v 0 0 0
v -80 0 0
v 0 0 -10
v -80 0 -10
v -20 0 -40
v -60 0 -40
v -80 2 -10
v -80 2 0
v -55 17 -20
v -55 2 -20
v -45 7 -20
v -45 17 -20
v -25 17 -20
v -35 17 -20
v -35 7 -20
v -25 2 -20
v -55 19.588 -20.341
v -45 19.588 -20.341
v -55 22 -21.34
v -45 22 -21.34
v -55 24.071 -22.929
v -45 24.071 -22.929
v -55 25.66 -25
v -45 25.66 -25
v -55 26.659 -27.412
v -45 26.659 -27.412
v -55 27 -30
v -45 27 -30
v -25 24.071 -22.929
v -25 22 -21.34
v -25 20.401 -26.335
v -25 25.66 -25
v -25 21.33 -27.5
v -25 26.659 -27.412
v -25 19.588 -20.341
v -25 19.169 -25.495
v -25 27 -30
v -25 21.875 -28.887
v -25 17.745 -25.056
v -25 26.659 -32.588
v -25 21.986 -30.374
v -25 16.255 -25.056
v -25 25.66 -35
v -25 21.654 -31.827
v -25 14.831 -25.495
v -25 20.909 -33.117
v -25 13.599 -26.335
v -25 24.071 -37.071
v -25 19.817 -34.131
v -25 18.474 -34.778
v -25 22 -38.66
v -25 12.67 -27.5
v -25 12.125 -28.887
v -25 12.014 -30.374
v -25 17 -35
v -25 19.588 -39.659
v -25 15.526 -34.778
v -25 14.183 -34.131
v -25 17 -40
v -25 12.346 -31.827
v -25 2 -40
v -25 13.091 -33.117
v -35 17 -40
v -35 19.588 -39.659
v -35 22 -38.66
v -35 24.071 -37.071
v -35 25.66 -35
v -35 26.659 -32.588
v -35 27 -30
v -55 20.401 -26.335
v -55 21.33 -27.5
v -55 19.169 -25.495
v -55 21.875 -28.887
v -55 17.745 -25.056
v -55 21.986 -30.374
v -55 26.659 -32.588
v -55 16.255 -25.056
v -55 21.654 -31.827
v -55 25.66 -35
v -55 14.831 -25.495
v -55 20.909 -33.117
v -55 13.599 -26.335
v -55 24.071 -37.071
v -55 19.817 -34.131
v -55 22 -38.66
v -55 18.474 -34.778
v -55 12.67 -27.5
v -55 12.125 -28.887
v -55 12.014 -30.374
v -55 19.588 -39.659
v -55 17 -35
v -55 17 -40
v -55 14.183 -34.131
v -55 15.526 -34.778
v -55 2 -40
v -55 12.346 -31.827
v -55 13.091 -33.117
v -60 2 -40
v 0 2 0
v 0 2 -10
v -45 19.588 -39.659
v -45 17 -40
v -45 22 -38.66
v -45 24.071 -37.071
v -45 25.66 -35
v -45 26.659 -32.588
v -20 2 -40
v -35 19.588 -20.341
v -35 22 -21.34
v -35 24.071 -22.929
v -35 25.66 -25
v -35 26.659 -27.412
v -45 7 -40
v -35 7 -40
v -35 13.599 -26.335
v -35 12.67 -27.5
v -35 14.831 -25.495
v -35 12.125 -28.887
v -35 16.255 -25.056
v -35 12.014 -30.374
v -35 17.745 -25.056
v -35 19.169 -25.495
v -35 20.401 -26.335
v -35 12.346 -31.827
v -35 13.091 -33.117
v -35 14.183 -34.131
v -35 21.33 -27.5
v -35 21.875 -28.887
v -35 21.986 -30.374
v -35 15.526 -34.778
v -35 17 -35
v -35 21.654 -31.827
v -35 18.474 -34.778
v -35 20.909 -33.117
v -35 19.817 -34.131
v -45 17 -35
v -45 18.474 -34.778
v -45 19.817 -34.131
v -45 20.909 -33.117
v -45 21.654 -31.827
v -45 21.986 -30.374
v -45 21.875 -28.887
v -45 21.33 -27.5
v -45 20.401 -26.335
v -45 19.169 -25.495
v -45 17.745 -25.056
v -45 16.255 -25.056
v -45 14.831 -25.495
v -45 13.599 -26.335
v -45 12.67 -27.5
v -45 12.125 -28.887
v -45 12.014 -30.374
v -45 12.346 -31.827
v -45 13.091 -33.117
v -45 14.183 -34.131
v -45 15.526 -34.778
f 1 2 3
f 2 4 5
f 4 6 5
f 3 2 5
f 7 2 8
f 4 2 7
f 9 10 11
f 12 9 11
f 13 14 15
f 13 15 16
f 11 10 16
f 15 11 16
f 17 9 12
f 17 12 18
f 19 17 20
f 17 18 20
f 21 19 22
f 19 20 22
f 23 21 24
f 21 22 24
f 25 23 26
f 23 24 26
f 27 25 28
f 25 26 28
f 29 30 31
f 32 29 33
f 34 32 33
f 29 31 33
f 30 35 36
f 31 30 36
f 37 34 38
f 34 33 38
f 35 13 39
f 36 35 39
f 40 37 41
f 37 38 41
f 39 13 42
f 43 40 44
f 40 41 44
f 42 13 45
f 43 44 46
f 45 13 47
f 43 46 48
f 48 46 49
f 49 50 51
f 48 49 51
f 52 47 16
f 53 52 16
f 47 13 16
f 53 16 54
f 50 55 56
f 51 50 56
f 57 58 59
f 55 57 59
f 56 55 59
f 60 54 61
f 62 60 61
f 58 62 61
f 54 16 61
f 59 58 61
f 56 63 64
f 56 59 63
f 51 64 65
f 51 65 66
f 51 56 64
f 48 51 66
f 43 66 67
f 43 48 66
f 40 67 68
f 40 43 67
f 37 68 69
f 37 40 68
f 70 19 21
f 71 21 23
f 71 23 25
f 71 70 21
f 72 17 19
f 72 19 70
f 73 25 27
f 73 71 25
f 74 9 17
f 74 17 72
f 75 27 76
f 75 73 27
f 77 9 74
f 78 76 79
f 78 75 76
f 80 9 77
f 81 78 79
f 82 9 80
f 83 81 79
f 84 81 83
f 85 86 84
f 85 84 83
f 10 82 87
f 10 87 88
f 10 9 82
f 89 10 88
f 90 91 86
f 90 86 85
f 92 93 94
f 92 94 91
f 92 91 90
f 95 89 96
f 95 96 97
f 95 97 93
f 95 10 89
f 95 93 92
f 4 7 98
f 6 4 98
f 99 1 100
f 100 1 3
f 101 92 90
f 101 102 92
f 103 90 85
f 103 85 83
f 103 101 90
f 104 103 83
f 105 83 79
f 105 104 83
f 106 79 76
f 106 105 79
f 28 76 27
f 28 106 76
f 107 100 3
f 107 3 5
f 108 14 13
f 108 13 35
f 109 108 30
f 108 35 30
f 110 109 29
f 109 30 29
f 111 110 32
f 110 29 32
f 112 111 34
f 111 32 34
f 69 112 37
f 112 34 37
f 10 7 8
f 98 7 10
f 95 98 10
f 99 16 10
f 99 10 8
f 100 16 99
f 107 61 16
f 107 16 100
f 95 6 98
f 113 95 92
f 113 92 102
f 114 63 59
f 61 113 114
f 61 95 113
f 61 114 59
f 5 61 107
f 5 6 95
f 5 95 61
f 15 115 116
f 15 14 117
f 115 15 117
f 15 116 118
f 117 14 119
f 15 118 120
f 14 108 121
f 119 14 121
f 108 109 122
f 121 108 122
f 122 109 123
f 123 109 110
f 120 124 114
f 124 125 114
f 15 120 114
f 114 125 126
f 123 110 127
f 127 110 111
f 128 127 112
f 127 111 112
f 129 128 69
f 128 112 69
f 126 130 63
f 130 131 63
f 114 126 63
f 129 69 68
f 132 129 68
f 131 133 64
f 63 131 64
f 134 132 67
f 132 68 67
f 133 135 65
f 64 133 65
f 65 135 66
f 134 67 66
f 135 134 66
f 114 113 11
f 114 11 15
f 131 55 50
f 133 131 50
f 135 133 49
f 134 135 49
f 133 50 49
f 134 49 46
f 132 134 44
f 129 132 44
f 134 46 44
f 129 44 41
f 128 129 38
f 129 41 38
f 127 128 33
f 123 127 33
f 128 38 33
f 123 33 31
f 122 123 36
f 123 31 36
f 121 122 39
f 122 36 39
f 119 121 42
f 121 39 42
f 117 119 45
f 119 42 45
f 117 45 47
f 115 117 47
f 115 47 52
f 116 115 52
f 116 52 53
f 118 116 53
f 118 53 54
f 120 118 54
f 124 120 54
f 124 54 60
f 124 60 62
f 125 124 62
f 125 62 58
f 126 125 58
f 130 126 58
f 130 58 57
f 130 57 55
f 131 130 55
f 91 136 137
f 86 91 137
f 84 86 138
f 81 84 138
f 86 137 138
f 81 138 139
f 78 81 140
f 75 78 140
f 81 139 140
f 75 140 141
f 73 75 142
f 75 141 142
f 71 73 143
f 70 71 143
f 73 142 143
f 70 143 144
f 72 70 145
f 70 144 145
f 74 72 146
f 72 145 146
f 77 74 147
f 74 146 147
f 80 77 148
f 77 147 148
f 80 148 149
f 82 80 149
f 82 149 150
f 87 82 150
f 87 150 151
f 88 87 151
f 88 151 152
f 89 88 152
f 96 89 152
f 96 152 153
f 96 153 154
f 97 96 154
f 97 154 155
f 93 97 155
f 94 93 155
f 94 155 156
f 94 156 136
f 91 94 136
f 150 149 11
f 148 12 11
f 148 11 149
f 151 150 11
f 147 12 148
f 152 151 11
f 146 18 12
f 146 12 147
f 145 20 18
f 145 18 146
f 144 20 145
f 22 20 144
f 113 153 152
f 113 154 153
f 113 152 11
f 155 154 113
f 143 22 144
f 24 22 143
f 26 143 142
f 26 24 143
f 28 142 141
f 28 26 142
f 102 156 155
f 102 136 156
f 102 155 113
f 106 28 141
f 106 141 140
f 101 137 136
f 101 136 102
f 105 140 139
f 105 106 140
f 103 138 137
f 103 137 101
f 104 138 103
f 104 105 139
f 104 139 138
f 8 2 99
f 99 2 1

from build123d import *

# Parameters (mm, degrees)
SKETCH1_W           = 80
SKETCH1_H           = 40
BOSS_EXTRUDE1_DEPTH = 2
CUT_EXTRUDE1_DEPTH  = 5
SKETCH3_W           = 30
SKETCH3_H           = 20
BOSS_EXTRUDE2_DEPTH = 25
SKETCH4_R           = 5
CUT_EXTRUDE2_DEPTH  = 74.17103252
SKETCH5_W           = 10
SKETCH5_H           = 20
CUT_EXTRUDE3_DEPTH  = 20
FILLET1_R           = 10


with BuildPart() as part:
    # Sketch1 → Boss-Extrude1 (new body)
    with BuildSketch(Plane(origin=(0, 0, 0), x_dir=(1, 0, 0), z_dir=(0, 1, 0))):
        with Locations((-40, 20)):
            Rectangle(SKETCH1_W, SKETCH1_H)
    extrude(amount=BOSS_EXTRUDE1_DEPTH)

    # Sketch2 → Cut-Extrude1 (cut)
    with BuildSketch(Plane(origin=(0, 2, 0), x_dir=(1, 0, 0), z_dir=(0, 1, 0))):
        Polygon((-80, 10), (-60, 40), (-80, 40), align=None)
        Polygon((0, 10), (-20, 40), (0, 40), align=None)
    extrude(amount=-CUT_EXTRUDE1_DEPTH, mode=Mode.SUBTRACT)

    # Sketch3 → Boss-Extrude2 (add)
    with BuildSketch(Plane(origin=(0, 2, 0), x_dir=(1, 0, 0), z_dir=(0, 1, 0))):
        with Locations((-40, 30)):
            Rectangle(SKETCH3_W, SKETCH3_H)
    extrude(amount=BOSS_EXTRUDE2_DEPTH)

    # Sketch4 → Cut-Extrude2 (cut, through all)
    with BuildSketch(Plane(origin=(-25, 0, 0), x_dir=(0, 0, -1), z_dir=(1, 0, 0))):
        with Locations((30, 17)):
            Circle(SKETCH4_R)
    extrude(amount=-CUT_EXTRUDE2_DEPTH, mode=Mode.SUBTRACT)

    # Sketch5 → Cut-Extrude3 (cut)
    with BuildSketch(Plane(origin=(0, 27, 0), x_dir=(1, 0, 0), z_dir=(0, 1, 0))):
        with Locations((-40, 30)):
            Rectangle(SKETCH5_W, SKETCH5_H)
    extrude(amount=-CUT_EXTRUDE3_DEPTH, mode=Mode.SUBTRACT)

    # Fillet1
    fillet1_edges = [part.edges().sort_by_distance(p)[0] for p in [
        (-30, 27, -20),
        (-50, 27, -20),
        (-50, 27, -40),
        (-30, 27, -40),
    ]]
    fillet(fillet1_edges, radius=FILLET1_R - 0.0001)  # a hair under: the kernel refuses the full size


solid = part.part
